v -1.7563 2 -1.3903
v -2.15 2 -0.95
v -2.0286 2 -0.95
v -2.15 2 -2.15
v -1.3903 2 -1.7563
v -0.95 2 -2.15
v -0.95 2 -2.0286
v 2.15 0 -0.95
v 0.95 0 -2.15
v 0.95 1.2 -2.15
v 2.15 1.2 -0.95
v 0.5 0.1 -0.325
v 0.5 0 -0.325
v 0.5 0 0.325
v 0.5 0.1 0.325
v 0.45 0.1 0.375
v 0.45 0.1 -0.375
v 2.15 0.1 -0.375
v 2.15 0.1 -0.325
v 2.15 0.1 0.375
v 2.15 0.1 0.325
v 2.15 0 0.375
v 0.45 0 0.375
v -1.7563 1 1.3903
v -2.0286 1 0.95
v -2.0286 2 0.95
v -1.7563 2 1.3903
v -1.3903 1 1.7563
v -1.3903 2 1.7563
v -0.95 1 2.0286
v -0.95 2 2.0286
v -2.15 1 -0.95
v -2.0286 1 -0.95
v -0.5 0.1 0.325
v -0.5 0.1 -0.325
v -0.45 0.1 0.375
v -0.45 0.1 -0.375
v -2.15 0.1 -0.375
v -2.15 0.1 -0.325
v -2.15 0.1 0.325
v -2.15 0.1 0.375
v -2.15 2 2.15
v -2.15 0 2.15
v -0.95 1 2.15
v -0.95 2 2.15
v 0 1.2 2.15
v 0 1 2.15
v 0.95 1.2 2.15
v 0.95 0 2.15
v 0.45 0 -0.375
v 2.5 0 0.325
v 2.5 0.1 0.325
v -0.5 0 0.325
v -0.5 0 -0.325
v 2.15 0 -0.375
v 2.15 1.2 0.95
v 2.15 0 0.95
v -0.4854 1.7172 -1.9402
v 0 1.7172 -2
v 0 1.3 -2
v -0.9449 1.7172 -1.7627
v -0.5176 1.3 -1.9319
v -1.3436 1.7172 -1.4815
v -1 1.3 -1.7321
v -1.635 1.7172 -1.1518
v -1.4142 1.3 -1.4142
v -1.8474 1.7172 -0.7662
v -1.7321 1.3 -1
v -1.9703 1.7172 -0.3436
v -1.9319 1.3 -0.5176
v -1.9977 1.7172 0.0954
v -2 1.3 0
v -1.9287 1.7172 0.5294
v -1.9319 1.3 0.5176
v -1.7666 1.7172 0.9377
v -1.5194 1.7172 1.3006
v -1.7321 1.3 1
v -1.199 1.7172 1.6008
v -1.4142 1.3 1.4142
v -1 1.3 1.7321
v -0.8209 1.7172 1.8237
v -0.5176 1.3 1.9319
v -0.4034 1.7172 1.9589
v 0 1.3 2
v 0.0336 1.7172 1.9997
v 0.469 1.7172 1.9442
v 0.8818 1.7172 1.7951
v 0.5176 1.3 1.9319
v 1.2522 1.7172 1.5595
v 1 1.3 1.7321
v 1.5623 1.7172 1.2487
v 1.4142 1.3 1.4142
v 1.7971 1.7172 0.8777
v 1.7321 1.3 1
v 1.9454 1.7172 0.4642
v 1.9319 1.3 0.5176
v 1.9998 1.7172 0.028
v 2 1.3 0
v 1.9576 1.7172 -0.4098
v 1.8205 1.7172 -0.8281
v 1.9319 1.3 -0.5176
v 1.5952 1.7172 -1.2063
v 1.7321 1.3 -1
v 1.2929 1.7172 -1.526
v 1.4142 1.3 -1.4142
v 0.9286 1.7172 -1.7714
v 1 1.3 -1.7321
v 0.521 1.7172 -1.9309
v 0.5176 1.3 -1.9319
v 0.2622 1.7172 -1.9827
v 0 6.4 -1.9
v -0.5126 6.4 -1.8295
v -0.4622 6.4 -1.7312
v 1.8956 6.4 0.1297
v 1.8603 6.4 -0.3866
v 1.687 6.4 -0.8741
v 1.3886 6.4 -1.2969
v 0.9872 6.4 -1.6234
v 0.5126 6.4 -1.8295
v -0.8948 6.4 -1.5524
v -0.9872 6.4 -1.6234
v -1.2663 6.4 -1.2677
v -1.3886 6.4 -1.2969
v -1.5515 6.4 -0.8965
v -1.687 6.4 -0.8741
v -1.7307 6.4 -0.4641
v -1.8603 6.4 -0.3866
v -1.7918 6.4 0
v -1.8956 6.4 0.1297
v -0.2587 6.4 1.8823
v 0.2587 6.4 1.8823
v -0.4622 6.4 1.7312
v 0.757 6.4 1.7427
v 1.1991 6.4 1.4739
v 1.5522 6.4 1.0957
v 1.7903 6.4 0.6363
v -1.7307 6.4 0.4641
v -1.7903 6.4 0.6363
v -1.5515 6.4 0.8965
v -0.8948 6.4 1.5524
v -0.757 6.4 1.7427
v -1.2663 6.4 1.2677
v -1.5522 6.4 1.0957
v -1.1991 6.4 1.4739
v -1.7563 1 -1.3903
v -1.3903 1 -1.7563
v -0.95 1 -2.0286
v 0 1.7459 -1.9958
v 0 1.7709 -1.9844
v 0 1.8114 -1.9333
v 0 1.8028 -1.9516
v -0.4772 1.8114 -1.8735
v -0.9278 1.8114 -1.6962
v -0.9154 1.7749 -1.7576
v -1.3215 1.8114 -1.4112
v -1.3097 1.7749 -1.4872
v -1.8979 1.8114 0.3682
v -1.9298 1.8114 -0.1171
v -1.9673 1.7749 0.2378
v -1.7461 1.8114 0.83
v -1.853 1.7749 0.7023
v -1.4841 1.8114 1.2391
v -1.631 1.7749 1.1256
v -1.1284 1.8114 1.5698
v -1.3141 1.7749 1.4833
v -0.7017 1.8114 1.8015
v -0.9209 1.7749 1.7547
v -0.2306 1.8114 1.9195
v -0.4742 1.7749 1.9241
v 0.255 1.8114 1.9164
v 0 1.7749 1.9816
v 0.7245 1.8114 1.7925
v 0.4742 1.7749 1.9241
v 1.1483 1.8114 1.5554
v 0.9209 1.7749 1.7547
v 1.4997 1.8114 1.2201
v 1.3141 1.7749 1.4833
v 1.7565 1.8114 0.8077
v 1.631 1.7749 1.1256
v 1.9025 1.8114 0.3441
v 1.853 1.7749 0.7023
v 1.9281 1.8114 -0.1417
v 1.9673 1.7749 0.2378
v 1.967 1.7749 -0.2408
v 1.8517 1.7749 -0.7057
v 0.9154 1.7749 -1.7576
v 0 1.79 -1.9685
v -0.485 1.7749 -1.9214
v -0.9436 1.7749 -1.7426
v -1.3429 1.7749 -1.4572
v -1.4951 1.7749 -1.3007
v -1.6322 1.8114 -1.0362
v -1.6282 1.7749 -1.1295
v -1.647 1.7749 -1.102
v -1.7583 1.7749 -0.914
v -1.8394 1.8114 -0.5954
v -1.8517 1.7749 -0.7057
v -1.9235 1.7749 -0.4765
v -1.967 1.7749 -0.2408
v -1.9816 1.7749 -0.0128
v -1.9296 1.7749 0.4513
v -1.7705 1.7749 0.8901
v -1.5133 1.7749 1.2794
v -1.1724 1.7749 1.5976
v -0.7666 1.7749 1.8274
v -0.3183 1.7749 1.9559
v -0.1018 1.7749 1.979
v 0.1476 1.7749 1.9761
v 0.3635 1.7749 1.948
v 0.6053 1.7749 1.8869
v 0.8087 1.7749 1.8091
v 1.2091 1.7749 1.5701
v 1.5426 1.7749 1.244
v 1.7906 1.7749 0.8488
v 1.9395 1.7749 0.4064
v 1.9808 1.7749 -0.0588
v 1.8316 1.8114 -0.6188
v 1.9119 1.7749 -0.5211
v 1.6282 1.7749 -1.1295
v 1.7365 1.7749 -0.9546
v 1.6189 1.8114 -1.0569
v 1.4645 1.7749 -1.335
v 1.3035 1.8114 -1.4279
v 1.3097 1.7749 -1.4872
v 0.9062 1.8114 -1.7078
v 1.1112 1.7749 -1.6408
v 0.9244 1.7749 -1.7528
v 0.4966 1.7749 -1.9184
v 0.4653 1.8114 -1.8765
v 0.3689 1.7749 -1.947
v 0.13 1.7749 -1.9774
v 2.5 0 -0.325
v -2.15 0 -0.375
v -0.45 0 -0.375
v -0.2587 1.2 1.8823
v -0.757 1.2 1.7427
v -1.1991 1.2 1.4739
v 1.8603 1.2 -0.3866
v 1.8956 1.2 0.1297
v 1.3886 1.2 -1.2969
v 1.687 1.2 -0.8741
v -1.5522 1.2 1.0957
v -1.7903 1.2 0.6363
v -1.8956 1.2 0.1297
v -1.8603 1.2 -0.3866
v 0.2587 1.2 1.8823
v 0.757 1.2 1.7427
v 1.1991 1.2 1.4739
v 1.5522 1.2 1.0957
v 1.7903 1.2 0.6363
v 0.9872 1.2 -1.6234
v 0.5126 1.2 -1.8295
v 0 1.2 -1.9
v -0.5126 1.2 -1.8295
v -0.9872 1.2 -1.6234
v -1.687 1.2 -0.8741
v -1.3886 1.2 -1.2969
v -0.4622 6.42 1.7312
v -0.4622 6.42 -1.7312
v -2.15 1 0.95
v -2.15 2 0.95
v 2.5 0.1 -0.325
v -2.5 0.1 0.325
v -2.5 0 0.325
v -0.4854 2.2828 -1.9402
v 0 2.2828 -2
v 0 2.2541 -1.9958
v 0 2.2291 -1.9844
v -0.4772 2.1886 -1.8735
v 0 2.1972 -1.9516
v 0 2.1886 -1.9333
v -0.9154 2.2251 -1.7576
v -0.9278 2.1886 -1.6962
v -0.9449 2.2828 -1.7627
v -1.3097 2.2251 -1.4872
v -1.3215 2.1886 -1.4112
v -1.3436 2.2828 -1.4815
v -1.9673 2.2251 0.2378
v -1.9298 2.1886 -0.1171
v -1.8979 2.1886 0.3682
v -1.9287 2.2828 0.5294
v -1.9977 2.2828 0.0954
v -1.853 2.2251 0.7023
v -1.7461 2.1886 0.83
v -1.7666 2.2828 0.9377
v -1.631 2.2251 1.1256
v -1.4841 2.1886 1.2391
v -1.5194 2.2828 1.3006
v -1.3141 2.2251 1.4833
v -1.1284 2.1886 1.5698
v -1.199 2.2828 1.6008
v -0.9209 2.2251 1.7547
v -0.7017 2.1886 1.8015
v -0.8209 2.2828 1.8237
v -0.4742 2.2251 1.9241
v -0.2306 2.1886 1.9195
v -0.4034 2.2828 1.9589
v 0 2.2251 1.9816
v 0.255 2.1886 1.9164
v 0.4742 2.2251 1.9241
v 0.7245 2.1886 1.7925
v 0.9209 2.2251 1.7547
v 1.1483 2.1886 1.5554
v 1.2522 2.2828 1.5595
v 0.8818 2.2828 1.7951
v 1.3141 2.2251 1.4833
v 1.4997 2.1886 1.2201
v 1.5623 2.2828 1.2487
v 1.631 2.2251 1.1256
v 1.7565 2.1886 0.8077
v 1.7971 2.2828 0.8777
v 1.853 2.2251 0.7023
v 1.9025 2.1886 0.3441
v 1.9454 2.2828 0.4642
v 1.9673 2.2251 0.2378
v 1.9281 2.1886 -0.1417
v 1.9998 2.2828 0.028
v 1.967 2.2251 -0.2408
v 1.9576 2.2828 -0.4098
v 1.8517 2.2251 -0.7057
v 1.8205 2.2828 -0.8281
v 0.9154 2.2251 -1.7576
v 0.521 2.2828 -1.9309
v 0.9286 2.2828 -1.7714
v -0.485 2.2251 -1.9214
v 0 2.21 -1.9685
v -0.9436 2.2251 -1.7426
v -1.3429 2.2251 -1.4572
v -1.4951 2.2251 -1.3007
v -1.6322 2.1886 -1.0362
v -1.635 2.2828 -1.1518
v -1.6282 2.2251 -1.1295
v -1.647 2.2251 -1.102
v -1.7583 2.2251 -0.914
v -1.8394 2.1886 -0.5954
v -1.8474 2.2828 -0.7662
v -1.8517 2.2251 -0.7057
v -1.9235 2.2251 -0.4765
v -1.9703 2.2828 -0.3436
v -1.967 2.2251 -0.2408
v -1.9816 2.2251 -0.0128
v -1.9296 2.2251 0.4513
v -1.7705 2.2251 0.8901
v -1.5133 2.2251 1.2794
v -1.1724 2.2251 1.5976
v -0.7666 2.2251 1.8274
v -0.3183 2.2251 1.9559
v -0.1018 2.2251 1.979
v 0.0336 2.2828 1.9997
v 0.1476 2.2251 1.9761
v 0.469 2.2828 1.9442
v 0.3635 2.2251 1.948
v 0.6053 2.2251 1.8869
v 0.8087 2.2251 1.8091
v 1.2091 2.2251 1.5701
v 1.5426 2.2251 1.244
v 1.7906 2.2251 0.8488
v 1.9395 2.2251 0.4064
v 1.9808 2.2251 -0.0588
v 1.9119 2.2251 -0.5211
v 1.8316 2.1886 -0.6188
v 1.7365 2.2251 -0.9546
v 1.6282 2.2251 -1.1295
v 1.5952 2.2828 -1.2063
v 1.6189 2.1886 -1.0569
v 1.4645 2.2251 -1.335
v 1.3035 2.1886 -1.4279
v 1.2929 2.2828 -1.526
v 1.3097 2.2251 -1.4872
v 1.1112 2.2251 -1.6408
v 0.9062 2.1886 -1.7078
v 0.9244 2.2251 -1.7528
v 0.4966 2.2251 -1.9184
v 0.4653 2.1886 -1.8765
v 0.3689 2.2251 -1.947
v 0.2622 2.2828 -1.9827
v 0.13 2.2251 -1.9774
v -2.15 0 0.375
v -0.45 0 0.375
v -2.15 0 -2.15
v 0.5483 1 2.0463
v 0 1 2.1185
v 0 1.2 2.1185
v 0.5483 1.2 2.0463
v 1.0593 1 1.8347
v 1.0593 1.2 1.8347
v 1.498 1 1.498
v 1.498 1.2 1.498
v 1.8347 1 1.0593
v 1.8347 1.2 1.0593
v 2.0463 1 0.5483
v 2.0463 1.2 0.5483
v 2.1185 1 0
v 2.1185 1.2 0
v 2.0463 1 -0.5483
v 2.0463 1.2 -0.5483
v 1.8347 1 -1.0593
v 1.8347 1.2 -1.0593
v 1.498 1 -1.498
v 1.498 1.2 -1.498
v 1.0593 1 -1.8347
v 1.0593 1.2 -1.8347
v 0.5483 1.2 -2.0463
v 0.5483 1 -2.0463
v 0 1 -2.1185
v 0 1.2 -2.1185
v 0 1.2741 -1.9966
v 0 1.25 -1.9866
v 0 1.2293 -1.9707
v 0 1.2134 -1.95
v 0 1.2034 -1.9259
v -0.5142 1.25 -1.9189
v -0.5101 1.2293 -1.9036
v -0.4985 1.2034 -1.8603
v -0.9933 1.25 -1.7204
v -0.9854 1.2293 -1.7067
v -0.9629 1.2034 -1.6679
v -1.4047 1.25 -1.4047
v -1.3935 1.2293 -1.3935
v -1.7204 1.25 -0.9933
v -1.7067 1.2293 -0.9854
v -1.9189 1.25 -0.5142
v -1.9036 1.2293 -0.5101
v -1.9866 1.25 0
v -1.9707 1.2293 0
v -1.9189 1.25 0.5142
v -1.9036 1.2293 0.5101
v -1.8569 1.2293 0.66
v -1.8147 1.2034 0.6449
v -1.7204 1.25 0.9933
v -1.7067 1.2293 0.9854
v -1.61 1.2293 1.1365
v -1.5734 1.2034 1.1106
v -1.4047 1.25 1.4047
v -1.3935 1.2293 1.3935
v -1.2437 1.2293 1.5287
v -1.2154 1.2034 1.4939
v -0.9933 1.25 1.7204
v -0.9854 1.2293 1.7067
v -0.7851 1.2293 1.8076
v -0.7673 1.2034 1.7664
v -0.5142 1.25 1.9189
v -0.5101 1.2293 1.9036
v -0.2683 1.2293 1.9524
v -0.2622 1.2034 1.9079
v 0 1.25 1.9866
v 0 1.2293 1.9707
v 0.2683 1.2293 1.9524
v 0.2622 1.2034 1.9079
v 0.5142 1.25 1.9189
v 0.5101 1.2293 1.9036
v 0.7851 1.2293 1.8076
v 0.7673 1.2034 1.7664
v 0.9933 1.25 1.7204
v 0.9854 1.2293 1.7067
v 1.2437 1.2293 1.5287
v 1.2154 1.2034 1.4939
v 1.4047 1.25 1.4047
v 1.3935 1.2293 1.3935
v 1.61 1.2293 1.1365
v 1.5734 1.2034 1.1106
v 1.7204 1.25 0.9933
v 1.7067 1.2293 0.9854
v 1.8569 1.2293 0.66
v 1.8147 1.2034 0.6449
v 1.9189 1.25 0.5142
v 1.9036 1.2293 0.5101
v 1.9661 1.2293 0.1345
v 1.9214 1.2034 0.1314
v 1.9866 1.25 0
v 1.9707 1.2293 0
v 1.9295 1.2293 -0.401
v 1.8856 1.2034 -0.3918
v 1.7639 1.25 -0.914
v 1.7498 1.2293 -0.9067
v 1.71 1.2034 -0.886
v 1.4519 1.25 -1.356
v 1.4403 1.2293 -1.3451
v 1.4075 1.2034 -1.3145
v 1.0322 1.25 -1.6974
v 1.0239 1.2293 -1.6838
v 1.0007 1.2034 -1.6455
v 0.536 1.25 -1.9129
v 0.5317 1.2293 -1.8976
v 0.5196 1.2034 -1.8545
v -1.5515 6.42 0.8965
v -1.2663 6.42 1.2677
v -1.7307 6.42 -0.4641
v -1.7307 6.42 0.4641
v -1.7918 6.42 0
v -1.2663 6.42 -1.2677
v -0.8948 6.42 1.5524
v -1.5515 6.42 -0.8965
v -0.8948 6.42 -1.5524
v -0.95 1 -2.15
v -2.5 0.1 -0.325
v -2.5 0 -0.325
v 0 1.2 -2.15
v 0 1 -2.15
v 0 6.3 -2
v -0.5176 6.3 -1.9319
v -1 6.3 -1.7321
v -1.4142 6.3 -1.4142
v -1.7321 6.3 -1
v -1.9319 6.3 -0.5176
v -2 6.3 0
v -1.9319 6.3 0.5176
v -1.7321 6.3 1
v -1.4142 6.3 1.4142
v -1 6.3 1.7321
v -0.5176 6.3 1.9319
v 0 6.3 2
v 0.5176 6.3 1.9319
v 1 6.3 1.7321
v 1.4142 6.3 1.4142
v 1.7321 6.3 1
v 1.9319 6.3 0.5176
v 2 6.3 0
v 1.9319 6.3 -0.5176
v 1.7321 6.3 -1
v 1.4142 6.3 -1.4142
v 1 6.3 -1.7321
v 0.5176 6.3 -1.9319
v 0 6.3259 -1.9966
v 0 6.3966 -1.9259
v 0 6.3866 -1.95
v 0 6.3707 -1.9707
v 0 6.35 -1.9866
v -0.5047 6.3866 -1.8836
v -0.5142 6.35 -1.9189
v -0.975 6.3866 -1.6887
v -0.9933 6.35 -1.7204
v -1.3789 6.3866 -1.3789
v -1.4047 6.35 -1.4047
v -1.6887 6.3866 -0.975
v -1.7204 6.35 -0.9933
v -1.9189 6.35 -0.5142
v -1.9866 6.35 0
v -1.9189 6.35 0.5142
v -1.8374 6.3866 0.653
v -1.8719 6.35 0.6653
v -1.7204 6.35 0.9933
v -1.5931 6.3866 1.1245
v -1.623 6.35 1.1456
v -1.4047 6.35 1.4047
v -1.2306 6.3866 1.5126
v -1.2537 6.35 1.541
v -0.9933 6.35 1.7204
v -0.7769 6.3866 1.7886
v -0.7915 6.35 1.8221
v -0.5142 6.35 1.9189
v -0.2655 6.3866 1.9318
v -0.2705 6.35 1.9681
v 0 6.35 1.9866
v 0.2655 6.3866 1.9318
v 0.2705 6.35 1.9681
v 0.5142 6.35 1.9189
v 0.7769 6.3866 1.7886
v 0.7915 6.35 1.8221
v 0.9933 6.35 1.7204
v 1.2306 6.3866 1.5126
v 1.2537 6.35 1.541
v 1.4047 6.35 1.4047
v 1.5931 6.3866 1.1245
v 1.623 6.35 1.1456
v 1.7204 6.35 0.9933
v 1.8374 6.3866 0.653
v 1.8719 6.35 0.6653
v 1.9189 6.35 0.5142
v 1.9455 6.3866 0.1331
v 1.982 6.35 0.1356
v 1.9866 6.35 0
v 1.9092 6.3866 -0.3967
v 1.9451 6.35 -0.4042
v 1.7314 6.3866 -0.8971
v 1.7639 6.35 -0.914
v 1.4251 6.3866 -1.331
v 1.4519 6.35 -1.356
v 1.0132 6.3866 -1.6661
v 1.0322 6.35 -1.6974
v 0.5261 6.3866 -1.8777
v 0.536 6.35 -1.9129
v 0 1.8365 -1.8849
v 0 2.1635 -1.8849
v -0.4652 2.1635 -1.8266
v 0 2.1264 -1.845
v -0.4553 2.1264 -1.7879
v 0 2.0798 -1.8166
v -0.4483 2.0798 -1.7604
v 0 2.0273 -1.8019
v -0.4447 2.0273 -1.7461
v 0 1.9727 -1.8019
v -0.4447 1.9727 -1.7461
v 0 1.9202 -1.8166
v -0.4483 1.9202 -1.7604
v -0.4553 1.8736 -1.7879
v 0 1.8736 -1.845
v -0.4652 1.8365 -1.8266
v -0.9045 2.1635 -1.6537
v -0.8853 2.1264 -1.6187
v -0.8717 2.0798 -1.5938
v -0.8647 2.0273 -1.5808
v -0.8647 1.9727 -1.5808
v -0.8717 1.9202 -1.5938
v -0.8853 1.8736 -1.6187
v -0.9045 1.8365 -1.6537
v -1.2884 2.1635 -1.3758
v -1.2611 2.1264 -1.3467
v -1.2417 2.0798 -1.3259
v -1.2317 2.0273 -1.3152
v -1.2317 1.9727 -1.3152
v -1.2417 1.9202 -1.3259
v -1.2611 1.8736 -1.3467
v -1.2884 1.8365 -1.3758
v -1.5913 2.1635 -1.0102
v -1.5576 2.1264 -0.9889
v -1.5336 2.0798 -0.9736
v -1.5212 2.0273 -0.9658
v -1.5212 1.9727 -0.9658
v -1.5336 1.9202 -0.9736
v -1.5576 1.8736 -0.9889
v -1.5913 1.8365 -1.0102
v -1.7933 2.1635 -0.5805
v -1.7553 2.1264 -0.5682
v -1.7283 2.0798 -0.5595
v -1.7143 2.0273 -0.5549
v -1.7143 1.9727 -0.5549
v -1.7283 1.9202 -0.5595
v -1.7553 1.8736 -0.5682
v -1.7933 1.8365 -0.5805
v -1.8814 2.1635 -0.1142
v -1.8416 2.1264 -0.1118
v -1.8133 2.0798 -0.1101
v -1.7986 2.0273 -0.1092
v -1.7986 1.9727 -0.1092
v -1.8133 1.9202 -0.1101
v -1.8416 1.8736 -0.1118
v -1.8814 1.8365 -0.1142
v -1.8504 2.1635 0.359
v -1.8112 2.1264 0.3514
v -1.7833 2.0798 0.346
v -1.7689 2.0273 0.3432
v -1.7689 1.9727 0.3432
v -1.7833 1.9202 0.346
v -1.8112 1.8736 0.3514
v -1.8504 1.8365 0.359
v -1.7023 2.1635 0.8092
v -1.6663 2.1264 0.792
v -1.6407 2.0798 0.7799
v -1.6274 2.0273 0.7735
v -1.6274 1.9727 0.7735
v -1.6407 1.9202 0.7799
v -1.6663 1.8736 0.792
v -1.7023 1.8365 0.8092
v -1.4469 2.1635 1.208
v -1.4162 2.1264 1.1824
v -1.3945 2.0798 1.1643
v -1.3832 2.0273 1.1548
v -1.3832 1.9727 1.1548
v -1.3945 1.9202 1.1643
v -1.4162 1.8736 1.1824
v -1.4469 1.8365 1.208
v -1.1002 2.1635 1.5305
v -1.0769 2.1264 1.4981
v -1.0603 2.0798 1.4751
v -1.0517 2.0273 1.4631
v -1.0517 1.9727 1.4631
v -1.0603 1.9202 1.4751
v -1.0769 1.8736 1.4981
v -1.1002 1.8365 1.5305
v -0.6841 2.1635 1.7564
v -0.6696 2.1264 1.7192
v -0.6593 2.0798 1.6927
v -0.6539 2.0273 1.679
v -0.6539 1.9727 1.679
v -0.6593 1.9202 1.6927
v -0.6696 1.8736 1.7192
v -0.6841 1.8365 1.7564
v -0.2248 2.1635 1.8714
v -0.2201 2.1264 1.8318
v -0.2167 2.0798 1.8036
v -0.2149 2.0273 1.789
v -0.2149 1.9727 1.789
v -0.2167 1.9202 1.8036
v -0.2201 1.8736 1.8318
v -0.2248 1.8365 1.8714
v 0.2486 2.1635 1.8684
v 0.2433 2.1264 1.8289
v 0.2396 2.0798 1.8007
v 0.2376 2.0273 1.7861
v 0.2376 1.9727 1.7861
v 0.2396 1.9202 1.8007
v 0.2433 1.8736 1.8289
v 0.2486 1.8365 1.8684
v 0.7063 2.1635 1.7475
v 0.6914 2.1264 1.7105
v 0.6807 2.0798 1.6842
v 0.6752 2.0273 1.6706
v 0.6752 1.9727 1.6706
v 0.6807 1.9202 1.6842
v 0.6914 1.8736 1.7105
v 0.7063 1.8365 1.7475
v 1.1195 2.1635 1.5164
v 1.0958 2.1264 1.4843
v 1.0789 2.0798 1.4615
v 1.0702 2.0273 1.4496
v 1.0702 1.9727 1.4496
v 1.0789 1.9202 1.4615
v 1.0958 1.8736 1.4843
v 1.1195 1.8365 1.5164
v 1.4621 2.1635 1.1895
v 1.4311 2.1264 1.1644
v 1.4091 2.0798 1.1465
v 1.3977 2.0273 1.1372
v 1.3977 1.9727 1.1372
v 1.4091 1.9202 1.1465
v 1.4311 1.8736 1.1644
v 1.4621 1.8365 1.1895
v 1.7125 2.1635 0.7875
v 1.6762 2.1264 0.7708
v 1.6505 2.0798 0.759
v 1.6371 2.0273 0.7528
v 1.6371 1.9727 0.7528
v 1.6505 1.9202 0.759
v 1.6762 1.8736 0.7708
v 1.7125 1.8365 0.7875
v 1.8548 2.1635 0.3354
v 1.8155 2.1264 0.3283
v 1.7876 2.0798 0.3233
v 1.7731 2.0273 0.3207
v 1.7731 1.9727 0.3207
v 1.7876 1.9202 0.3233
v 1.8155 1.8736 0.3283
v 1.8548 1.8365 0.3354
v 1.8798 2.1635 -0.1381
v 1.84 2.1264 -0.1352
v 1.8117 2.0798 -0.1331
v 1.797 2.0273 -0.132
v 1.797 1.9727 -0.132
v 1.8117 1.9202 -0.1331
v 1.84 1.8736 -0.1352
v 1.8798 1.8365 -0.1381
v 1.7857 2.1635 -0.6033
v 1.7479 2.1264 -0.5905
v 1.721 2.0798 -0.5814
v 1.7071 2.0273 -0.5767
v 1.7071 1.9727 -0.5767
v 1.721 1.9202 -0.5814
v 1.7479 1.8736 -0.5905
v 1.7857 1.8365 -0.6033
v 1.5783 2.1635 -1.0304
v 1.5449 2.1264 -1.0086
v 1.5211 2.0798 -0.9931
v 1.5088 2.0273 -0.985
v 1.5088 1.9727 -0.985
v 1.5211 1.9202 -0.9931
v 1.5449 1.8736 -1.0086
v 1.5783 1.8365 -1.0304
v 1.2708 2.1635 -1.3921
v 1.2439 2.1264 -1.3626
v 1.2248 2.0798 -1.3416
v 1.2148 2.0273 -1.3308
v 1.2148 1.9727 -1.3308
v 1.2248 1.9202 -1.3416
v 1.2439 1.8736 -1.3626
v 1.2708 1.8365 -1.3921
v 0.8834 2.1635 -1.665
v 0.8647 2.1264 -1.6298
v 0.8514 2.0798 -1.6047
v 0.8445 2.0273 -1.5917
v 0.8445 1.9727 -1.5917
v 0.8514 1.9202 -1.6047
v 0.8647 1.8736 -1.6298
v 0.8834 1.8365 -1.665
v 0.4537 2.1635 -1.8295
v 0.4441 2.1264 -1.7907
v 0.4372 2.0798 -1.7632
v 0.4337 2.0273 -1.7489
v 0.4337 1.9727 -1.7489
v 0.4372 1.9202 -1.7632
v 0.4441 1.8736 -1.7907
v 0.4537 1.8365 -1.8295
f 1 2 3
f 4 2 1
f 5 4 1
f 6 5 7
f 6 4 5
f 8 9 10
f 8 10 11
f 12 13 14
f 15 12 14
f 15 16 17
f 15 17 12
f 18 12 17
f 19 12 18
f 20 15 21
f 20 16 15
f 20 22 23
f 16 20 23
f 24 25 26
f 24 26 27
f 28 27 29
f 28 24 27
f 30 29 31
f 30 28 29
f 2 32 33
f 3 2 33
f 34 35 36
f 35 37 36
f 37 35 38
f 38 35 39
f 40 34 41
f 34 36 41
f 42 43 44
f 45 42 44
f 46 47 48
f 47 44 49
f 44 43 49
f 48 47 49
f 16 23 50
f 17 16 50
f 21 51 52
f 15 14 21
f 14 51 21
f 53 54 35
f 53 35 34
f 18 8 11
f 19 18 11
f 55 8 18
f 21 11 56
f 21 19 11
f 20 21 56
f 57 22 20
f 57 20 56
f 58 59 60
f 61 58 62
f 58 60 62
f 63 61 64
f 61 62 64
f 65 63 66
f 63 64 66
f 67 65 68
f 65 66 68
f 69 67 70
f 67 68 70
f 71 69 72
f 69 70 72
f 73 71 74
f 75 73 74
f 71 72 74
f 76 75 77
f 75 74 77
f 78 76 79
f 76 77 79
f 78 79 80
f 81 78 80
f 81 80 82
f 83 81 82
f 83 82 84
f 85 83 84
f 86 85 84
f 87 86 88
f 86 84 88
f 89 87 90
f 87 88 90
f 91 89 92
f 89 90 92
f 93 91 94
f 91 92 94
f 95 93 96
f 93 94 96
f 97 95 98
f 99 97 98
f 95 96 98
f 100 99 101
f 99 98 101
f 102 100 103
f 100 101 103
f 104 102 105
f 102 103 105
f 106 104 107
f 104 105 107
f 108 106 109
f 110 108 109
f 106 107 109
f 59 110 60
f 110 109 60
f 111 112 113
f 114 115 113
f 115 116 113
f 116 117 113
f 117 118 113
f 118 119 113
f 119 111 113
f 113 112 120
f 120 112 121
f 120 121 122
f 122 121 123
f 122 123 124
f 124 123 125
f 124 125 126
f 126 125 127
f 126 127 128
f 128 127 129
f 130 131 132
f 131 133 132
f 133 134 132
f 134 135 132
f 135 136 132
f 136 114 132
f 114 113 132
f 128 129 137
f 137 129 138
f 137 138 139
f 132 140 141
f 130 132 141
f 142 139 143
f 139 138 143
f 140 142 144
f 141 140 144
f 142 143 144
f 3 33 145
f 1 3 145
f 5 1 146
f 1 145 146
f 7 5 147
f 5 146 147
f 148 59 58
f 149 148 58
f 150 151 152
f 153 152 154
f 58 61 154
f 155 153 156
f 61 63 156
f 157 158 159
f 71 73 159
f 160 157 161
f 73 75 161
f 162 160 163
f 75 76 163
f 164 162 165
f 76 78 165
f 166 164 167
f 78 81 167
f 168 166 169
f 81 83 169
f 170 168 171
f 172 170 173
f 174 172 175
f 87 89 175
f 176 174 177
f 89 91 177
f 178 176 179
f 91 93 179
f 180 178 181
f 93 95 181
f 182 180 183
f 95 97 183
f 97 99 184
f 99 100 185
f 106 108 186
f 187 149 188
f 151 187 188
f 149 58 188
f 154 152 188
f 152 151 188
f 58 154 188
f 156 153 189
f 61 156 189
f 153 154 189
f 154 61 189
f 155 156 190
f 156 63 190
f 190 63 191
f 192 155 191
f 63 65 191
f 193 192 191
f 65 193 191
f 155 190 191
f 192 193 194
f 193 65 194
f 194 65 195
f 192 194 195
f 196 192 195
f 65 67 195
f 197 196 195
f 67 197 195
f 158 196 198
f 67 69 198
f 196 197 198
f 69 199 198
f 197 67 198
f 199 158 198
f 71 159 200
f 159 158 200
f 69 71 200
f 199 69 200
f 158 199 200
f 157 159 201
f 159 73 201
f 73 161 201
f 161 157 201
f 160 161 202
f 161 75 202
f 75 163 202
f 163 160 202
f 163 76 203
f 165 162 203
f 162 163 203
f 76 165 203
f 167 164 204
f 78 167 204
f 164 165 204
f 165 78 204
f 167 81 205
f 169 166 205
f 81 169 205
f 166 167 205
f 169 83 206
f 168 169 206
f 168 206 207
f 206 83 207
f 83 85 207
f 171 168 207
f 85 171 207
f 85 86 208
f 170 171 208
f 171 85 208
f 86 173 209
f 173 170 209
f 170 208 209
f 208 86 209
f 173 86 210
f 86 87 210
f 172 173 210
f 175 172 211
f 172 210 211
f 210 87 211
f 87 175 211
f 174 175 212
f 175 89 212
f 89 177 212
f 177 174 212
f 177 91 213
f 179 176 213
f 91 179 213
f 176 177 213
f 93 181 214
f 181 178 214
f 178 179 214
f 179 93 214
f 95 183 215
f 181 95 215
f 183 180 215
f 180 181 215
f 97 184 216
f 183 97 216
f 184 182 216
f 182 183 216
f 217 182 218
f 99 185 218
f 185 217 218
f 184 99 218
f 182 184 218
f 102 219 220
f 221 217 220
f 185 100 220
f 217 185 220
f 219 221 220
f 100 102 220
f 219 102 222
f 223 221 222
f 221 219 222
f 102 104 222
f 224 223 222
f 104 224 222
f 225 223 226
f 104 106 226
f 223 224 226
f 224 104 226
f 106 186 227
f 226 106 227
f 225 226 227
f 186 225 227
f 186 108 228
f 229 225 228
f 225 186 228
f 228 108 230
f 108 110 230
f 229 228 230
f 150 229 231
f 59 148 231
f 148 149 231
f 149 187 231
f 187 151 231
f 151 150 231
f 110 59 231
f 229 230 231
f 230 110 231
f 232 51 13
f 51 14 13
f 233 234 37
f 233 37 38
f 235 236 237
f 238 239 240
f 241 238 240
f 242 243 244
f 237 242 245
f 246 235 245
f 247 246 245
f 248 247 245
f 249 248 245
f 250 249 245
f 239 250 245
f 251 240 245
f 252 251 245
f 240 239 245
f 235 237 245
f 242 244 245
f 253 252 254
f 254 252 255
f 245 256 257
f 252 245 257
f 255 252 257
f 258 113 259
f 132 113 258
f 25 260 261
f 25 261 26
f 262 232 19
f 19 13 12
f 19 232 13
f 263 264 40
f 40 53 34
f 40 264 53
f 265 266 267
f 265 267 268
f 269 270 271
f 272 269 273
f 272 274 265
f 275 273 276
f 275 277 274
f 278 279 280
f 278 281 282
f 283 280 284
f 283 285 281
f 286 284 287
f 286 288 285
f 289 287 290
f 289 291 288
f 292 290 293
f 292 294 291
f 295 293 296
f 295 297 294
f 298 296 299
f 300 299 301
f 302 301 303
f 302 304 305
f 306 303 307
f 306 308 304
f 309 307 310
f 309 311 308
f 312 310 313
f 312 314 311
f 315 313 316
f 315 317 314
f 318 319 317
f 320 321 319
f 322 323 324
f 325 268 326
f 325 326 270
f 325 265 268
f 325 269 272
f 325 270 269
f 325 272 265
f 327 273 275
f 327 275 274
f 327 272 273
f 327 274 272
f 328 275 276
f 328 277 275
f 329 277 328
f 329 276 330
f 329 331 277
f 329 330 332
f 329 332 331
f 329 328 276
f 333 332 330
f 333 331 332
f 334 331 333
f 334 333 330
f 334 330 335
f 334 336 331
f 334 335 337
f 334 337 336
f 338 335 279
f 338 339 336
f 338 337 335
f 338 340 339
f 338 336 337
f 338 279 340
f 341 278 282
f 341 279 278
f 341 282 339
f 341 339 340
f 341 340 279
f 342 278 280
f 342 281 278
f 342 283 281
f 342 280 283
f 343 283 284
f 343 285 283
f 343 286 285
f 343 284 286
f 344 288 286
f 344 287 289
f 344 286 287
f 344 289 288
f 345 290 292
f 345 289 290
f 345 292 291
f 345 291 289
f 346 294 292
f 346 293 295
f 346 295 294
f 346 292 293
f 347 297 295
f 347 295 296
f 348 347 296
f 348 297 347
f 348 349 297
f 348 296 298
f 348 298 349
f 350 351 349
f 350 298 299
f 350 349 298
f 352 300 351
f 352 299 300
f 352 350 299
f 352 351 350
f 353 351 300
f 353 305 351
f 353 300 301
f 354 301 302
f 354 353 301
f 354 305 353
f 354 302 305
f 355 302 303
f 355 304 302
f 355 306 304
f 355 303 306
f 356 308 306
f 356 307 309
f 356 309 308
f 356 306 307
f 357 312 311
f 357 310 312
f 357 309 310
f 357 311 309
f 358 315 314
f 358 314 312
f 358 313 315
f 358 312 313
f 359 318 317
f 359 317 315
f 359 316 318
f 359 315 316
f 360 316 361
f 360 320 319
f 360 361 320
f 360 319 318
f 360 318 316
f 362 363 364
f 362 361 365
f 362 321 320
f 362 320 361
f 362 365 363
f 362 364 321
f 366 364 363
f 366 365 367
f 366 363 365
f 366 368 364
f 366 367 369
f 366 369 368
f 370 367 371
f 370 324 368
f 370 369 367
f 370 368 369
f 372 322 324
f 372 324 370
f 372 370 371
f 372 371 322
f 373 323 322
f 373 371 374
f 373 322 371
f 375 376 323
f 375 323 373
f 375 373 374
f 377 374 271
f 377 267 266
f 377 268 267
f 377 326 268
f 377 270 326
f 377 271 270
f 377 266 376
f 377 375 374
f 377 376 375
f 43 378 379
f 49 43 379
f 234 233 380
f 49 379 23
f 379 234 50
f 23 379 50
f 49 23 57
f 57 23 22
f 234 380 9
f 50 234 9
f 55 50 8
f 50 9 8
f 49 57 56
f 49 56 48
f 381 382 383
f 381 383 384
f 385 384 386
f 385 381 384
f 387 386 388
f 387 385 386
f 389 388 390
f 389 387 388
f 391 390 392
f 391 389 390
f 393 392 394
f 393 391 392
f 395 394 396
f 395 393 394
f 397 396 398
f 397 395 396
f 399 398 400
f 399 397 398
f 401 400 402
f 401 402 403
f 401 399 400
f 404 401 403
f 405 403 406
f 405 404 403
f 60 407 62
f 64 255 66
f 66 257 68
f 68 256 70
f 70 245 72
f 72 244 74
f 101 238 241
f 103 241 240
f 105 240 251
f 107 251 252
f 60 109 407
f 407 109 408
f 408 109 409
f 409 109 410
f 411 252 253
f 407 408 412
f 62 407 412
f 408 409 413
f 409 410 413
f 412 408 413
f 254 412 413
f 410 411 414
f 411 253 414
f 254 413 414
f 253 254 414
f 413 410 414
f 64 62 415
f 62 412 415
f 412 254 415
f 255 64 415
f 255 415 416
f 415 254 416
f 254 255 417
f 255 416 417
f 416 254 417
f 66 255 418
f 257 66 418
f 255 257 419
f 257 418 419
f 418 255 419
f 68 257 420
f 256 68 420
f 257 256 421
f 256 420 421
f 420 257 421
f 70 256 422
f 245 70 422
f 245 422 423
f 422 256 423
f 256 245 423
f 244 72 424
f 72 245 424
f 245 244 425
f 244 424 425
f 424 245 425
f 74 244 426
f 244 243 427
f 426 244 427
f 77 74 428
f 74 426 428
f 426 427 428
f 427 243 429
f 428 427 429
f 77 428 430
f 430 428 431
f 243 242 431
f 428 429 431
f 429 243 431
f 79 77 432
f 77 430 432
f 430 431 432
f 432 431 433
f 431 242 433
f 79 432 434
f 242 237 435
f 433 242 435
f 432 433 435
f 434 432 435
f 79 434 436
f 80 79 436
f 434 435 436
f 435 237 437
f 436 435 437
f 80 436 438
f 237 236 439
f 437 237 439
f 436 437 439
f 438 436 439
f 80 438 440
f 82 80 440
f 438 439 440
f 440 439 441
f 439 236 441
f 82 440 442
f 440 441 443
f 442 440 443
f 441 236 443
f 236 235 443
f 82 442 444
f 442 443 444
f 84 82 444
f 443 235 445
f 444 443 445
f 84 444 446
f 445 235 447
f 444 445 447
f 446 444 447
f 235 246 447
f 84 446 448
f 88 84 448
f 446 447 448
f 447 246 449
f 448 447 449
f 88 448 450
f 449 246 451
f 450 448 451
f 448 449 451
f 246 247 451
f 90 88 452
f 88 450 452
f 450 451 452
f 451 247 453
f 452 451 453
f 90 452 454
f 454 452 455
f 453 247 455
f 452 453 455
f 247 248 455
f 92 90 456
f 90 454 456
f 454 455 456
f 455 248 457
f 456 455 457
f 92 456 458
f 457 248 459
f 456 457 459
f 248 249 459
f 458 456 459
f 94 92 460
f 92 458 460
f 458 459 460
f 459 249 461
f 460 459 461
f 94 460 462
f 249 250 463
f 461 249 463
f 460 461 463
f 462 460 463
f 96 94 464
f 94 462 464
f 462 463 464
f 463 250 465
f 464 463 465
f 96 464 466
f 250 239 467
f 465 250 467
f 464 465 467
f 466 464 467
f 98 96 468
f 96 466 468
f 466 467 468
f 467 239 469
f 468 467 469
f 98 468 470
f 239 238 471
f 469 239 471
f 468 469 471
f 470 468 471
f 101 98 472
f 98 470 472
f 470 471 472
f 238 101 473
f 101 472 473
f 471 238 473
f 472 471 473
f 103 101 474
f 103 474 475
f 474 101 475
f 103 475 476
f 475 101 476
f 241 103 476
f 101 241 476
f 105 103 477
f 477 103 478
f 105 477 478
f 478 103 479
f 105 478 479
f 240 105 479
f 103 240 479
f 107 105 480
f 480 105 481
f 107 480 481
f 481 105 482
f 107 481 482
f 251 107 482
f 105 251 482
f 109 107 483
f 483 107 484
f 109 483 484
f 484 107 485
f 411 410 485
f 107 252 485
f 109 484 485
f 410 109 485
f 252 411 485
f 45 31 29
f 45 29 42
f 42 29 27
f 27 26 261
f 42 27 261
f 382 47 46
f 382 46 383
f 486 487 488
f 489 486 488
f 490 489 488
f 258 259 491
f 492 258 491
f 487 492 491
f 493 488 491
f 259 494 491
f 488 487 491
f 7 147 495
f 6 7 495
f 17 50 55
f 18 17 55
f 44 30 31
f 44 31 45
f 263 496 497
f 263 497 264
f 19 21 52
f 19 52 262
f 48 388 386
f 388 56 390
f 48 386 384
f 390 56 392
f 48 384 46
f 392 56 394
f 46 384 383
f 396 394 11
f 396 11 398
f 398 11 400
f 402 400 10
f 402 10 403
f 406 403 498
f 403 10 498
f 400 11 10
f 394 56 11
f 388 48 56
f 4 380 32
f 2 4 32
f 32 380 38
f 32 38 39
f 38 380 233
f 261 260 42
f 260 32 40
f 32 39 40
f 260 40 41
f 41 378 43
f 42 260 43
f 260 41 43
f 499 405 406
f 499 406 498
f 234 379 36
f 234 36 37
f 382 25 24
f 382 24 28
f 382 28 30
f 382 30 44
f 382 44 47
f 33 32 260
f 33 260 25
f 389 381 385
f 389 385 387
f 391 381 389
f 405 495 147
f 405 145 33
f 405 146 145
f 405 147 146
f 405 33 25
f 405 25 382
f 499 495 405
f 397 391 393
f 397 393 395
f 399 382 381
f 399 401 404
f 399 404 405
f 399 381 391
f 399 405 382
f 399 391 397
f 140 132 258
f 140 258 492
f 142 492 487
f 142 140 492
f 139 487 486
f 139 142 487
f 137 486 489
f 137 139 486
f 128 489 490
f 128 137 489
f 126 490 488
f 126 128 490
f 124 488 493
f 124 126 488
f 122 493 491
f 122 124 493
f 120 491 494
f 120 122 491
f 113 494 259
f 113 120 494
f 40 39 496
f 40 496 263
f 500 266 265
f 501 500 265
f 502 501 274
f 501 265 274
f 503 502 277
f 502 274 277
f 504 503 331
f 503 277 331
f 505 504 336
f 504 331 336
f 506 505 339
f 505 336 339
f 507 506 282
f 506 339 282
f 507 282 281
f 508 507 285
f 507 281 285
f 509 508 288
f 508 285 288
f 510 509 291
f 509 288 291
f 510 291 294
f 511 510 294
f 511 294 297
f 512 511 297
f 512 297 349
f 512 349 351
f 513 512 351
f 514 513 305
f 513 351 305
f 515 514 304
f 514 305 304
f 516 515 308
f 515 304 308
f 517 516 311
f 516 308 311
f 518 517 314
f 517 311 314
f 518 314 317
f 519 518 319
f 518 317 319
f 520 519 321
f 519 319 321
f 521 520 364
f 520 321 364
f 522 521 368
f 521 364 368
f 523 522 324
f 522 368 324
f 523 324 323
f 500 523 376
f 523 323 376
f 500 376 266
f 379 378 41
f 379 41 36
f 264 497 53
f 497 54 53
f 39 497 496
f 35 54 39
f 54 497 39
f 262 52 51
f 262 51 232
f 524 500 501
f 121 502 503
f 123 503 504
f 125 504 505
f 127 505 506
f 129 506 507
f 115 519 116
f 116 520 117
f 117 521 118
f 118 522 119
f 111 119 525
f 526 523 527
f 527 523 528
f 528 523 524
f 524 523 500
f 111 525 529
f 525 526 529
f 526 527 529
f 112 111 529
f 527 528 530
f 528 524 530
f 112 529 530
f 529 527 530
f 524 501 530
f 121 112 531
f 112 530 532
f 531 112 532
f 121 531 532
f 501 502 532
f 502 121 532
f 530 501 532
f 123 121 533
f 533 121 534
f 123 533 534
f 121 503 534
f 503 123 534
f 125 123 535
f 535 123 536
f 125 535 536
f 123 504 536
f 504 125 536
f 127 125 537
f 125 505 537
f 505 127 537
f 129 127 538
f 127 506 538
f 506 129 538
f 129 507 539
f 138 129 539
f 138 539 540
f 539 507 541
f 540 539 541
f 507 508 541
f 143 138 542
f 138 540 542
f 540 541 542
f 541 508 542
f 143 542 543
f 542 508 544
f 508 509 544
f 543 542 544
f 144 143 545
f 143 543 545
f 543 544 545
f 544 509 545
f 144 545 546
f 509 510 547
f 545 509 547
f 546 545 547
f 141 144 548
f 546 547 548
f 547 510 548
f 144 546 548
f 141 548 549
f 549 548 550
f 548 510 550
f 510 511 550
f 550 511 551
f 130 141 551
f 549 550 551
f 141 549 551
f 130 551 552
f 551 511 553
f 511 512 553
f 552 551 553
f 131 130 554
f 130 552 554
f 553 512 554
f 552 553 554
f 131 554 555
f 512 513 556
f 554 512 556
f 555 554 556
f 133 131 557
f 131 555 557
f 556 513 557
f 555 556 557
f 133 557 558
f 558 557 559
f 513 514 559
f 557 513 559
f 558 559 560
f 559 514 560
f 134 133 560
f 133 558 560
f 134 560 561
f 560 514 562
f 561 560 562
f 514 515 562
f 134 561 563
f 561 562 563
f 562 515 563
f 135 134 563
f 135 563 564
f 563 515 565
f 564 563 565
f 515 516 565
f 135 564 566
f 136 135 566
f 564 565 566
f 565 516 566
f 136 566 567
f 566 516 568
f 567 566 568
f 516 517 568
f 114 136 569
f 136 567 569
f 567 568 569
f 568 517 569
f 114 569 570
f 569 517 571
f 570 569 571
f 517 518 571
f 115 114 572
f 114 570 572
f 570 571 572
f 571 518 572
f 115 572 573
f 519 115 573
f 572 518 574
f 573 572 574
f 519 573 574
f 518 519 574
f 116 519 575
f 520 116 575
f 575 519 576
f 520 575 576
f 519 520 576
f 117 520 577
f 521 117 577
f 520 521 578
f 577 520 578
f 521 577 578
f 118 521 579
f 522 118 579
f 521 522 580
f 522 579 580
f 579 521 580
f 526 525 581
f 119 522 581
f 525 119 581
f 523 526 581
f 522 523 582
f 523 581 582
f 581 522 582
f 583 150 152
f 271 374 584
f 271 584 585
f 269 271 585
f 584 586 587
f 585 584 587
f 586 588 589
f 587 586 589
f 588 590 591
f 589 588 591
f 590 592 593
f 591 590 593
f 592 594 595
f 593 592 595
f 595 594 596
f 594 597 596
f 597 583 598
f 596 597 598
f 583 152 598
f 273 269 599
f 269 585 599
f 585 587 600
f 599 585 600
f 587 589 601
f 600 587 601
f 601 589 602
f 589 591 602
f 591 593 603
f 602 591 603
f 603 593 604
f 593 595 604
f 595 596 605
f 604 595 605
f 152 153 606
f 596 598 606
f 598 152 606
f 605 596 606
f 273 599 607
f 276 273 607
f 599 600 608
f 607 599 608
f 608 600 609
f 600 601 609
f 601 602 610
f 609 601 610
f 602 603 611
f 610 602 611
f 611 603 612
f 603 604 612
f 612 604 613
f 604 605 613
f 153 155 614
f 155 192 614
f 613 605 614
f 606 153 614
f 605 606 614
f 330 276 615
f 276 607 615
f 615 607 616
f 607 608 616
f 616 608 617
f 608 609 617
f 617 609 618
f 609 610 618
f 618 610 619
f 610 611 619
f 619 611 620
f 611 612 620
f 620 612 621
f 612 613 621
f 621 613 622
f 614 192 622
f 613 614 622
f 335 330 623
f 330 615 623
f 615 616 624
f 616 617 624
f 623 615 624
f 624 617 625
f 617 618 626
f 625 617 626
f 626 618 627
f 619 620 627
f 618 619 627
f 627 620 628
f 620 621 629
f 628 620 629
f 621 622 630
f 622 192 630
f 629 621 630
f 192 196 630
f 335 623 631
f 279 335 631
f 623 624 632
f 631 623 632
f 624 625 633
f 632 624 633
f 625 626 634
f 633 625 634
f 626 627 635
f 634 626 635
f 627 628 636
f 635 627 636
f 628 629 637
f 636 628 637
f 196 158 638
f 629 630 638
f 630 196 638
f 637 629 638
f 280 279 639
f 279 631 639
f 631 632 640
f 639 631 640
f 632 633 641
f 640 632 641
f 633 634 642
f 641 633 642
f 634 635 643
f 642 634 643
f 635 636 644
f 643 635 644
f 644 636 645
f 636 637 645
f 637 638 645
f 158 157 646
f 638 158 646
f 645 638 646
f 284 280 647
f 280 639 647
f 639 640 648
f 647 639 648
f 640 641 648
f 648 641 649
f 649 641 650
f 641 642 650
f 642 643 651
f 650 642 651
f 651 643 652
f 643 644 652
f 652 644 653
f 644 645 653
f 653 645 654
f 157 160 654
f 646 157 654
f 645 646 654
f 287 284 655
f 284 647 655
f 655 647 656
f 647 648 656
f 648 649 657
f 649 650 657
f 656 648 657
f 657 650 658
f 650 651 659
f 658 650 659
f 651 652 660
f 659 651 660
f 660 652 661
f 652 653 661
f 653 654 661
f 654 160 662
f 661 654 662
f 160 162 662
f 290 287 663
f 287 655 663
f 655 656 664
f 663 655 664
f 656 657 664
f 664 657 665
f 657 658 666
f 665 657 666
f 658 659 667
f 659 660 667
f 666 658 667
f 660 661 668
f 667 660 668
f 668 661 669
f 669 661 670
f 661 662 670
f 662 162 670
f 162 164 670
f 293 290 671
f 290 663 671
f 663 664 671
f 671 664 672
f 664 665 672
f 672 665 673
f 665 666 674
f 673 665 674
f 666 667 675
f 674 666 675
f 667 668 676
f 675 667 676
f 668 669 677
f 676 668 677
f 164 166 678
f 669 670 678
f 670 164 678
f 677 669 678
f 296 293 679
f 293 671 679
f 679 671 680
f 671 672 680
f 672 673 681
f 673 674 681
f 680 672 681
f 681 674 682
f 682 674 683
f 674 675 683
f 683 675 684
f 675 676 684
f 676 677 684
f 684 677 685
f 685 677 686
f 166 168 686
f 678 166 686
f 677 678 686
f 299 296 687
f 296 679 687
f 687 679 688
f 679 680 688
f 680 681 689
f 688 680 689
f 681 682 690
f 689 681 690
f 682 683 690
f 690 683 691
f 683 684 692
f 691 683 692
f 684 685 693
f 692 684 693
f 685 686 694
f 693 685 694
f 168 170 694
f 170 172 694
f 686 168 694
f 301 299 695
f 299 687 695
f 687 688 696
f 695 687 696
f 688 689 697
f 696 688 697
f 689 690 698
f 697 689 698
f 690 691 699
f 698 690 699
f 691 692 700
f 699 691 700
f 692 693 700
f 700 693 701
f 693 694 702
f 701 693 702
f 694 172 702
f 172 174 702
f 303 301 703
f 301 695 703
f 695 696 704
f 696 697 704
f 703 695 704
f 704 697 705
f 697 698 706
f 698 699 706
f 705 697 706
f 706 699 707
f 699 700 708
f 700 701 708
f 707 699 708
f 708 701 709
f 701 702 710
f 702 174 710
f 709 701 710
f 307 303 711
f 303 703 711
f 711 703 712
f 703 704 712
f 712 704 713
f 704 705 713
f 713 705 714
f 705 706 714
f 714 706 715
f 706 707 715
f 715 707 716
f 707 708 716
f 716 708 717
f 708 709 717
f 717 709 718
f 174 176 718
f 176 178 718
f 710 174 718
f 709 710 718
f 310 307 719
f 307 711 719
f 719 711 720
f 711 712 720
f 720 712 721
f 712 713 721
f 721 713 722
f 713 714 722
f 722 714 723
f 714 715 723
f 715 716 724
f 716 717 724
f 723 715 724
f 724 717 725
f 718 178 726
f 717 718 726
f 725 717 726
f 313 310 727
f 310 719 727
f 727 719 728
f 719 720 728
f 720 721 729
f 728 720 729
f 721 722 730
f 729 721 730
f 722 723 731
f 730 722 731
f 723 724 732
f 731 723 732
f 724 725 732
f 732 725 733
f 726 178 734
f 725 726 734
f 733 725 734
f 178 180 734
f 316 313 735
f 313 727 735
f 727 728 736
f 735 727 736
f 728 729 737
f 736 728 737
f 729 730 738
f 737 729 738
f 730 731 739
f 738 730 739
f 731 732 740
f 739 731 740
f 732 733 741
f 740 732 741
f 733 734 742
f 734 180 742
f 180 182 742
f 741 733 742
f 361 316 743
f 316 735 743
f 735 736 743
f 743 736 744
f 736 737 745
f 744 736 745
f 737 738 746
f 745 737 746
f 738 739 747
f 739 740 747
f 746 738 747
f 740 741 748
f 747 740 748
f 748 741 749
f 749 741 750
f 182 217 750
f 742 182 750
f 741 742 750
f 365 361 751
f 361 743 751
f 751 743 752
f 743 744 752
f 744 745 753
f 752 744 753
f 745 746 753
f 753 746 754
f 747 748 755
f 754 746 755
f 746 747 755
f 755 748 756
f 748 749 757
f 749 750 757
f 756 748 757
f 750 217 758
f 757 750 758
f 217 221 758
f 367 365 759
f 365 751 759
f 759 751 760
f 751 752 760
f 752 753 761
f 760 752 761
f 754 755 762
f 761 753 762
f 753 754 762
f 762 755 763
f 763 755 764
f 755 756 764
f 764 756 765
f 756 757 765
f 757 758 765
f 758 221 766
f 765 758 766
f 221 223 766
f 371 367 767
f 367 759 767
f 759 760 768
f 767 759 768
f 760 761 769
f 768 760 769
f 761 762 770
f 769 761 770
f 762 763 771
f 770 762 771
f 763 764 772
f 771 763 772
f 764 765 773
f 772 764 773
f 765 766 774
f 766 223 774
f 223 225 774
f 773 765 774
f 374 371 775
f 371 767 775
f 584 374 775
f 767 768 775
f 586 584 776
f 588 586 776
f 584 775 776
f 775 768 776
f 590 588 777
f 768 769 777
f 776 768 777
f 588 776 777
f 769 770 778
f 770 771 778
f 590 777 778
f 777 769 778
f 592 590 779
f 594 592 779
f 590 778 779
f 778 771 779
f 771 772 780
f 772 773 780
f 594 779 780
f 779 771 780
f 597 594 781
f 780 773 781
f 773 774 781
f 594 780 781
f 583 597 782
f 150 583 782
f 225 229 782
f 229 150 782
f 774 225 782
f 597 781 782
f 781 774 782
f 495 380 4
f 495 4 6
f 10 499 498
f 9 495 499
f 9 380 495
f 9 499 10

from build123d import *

# Parameters (mm, degrees)
SKETCH_1_W          = 4.3
SKETCH_1_H          = 4.3
EXTRUDE_1_DEPTH     = 1
CUT_EXTRUDE_3_DEPTH = 4.200781155
EXTRUDE_2_DEPTH     = 1
EXTRUDE_3_DEPTH     = 0.2
FILLET_1_R          = 0.1
CUT_EXTRUDE_4_DEPTH = 0.1
SKETCH_11_W         = 0.65
SKETCH_11_H         = 0.1
EXTRUDE_6_DEPTH     = 0.35
SKETCH_12_W         = 0.65
SKETCH_12_H         = 0.1
EXTRUDE_7_DEPTH     = 0.35
EXTRUDE_8_DEPTH     = 0.02


with BuildPart() as part:
    # Эскиз1 → Бобышка-Вытянуть1 (new body)
    with BuildSketch(Plane(origin=(0, 0, 0), x_dir=(1, 0, 0), z_dir=(0, 1, 0))):
        Rectangle(SKETCH_1_W, SKETCH_1_H)
    extrude(amount=EXTRUDE_1_DEPTH)

    # Эскиз2a → Вырез-Вытянуть3 (cut, through all)
    with BuildSketch(Plane(origin=(0, 1, 0), x_dir=(1, 0, 0), z_dir=(0, 1, 0))):
        Polygon((2.15, 0.95), (2.15, 2.15), (0.95, 2.15), align=None)
        Polygon((2.15, -0.95), (2.15, -2.15), (0.95, -2.15), align=None)
    extrude(amount=-CUT_EXTRUDE_3_DEPTH, mode=Mode.SUBTRACT)

    # Эскиз4 → Бобышка-Вытянуть2 (add)
    with BuildSketch(Plane(origin=(0, 1, 0), x_dir=(1, 0, 0), z_dir=(0, 1, 0))):
        with BuildLine():
            Line((-2.15, 0.95), (-2.028570926, 0.95))
            ThreePointArc((-2.028570926, 0.95), (-1.58391919, 1.58391919), (-0.95, 2.028570926))
            Line((-0.95, 2.028570926), (-0.95, 2.15))
            Line((-0.95, 2.15), (-2.15, 2.15))
            Line((-2.15, 2.15), (-2.15, 0.95))
        make_face()
        with BuildLine():
            Line((-0.95, -2.028570926), (-0.95, -2.15))
            Line((-0.95, -2.15), (-2.15, -2.15))
            Line((-2.15, -2.15), (-2.15, -0.95))
            Line((-2.15, -0.95), (-2.028570926, -0.95))
            ThreePointArc((-2.028570926, -0.95), (-1.58391919, -1.58391919), (-0.95, -2.028570926))
        make_face()
    extrude(amount=EXTRUDE_2_DEPTH)

    # Эскиз5 → Бобышка-Вытянуть3 (add)
    with BuildSketch(Plane(origin=(0, 1, 0), x_dir=(1, 0, 0), z_dir=(0, 1, 0))):
        with BuildLine():
            Line((0, 2.118501232), (0, 2.15))
            Line((0, 2.15), (0.95, 2.15))
            Line((0.95, 2.15), (2.15, 0.95))
            Line((2.15, 0.95), (2.15, -0.95))
            Line((2.15, -0.95), (0.95, -2.15))
            Line((0.95, -2.15), (0, -2.15))
            Line((0, -2.15), (0, -2.118501232))
            ThreePointArc((0, -2.118501232), (2.118501232, 0), (0, 2.118501232))
        make_face()
    extrude(amount=EXTRUDE_3_DEPTH)

    # Эскиз10 → Вырез-Вытянуть4 (cut)
    with BuildSketch(Plane.XZ):
        Polygon((-2.15, 0.325), (-2.15, 0.375), (-0.45, 0.375), (-0.45, -0.375), (-2.15, -0.375), (-2.15, -0.325), (-0.5, -0.325), (-0.5, 0.325), align=None)
        Polygon((2.15, 0.375), (0.45, 0.375), (0.45, -0.375), (2.15, -0.375), (2.15, -0.325), (0.5, -0.325), (0.5, 0.325), (2.15, 0.325), align=None)
    extrude(amount=-CUT_EXTRUDE_4_DEPTH, mode=Mode.SUBTRACT)

    # Эскиз11 → Бобышка-Вытянуть6 (add)
    with BuildSketch(Plane(origin=(2.15, 0, 0), x_dir=(0, 0, -1), z_dir=(1, 0, 0))):
        with Locations((0, 0.05)):
            Rectangle(SKETCH_11_W, SKETCH_11_H)
    extrude(amount=EXTRUDE_6_DEPTH)

    # Эскиз12 → Бобышка-Вытянуть7 (add)
    with BuildSketch(Plane.ZY.offset(2.15)):
        with Locations((0, 0.05)):
            Rectangle(SKETCH_12_W, SKETCH_12_H)
    extrude(amount=EXTRUDE_7_DEPTH)


with BuildPart() as body_2:
    # Эскиз9 → Повернуть1 (revolve)
    with BuildSketch(Plane(origin=(0, 0, 0), x_dir=(0, 0, -1), z_dir=(1, 0, 0))):
        with BuildLine():
            Line((2, 1.8), (2, 1.2))
            Line((2, 1.2), (0, 1.2))
            Line((0, 1.2), (0, 6.4))
            Line((0, 6.4), (2, 6.4))
            Line((2, 6.4), (2, 2.2))
            ThreePointArc((2, 2.2), (1.8, 2), (2, 1.8))
        make_face()
    revolve(axis=Axis((0, -0.316749393, 0), (0, 1, 0)))

    # Скругление1
    fillet_1_edges = [body_2.edges().sort_by_distance(p)[0] for p in [
        (0, 6.4, 2),
        (0, 2.2, 2),
        (0, 1.8, 2),
        (0, 1.2, 2),
    ]]
    fillet(fillet_1_edges, radius=FILLET_1_R)

    # Эскиз13 → Бобышка-Вытянуть8 (add)
    with BuildSketch(Plane(origin=(0, 6.4, 0), x_dir=(1, 0, 0), z_dir=(0, 1, 0))):
        with BuildLine():
            Line((-0.462179651, 1.731215258), (-0.462179651, -1.731215258))
            ThreePointArc((-0.462179651, -1.731215258), (-1.791847175, 0), (-0.462179651, 1.731215258))
        make_face()
    extrude(amount=EXTRUDE_8_DEPTH)


solid = Compound([part.part, body_2.part])
